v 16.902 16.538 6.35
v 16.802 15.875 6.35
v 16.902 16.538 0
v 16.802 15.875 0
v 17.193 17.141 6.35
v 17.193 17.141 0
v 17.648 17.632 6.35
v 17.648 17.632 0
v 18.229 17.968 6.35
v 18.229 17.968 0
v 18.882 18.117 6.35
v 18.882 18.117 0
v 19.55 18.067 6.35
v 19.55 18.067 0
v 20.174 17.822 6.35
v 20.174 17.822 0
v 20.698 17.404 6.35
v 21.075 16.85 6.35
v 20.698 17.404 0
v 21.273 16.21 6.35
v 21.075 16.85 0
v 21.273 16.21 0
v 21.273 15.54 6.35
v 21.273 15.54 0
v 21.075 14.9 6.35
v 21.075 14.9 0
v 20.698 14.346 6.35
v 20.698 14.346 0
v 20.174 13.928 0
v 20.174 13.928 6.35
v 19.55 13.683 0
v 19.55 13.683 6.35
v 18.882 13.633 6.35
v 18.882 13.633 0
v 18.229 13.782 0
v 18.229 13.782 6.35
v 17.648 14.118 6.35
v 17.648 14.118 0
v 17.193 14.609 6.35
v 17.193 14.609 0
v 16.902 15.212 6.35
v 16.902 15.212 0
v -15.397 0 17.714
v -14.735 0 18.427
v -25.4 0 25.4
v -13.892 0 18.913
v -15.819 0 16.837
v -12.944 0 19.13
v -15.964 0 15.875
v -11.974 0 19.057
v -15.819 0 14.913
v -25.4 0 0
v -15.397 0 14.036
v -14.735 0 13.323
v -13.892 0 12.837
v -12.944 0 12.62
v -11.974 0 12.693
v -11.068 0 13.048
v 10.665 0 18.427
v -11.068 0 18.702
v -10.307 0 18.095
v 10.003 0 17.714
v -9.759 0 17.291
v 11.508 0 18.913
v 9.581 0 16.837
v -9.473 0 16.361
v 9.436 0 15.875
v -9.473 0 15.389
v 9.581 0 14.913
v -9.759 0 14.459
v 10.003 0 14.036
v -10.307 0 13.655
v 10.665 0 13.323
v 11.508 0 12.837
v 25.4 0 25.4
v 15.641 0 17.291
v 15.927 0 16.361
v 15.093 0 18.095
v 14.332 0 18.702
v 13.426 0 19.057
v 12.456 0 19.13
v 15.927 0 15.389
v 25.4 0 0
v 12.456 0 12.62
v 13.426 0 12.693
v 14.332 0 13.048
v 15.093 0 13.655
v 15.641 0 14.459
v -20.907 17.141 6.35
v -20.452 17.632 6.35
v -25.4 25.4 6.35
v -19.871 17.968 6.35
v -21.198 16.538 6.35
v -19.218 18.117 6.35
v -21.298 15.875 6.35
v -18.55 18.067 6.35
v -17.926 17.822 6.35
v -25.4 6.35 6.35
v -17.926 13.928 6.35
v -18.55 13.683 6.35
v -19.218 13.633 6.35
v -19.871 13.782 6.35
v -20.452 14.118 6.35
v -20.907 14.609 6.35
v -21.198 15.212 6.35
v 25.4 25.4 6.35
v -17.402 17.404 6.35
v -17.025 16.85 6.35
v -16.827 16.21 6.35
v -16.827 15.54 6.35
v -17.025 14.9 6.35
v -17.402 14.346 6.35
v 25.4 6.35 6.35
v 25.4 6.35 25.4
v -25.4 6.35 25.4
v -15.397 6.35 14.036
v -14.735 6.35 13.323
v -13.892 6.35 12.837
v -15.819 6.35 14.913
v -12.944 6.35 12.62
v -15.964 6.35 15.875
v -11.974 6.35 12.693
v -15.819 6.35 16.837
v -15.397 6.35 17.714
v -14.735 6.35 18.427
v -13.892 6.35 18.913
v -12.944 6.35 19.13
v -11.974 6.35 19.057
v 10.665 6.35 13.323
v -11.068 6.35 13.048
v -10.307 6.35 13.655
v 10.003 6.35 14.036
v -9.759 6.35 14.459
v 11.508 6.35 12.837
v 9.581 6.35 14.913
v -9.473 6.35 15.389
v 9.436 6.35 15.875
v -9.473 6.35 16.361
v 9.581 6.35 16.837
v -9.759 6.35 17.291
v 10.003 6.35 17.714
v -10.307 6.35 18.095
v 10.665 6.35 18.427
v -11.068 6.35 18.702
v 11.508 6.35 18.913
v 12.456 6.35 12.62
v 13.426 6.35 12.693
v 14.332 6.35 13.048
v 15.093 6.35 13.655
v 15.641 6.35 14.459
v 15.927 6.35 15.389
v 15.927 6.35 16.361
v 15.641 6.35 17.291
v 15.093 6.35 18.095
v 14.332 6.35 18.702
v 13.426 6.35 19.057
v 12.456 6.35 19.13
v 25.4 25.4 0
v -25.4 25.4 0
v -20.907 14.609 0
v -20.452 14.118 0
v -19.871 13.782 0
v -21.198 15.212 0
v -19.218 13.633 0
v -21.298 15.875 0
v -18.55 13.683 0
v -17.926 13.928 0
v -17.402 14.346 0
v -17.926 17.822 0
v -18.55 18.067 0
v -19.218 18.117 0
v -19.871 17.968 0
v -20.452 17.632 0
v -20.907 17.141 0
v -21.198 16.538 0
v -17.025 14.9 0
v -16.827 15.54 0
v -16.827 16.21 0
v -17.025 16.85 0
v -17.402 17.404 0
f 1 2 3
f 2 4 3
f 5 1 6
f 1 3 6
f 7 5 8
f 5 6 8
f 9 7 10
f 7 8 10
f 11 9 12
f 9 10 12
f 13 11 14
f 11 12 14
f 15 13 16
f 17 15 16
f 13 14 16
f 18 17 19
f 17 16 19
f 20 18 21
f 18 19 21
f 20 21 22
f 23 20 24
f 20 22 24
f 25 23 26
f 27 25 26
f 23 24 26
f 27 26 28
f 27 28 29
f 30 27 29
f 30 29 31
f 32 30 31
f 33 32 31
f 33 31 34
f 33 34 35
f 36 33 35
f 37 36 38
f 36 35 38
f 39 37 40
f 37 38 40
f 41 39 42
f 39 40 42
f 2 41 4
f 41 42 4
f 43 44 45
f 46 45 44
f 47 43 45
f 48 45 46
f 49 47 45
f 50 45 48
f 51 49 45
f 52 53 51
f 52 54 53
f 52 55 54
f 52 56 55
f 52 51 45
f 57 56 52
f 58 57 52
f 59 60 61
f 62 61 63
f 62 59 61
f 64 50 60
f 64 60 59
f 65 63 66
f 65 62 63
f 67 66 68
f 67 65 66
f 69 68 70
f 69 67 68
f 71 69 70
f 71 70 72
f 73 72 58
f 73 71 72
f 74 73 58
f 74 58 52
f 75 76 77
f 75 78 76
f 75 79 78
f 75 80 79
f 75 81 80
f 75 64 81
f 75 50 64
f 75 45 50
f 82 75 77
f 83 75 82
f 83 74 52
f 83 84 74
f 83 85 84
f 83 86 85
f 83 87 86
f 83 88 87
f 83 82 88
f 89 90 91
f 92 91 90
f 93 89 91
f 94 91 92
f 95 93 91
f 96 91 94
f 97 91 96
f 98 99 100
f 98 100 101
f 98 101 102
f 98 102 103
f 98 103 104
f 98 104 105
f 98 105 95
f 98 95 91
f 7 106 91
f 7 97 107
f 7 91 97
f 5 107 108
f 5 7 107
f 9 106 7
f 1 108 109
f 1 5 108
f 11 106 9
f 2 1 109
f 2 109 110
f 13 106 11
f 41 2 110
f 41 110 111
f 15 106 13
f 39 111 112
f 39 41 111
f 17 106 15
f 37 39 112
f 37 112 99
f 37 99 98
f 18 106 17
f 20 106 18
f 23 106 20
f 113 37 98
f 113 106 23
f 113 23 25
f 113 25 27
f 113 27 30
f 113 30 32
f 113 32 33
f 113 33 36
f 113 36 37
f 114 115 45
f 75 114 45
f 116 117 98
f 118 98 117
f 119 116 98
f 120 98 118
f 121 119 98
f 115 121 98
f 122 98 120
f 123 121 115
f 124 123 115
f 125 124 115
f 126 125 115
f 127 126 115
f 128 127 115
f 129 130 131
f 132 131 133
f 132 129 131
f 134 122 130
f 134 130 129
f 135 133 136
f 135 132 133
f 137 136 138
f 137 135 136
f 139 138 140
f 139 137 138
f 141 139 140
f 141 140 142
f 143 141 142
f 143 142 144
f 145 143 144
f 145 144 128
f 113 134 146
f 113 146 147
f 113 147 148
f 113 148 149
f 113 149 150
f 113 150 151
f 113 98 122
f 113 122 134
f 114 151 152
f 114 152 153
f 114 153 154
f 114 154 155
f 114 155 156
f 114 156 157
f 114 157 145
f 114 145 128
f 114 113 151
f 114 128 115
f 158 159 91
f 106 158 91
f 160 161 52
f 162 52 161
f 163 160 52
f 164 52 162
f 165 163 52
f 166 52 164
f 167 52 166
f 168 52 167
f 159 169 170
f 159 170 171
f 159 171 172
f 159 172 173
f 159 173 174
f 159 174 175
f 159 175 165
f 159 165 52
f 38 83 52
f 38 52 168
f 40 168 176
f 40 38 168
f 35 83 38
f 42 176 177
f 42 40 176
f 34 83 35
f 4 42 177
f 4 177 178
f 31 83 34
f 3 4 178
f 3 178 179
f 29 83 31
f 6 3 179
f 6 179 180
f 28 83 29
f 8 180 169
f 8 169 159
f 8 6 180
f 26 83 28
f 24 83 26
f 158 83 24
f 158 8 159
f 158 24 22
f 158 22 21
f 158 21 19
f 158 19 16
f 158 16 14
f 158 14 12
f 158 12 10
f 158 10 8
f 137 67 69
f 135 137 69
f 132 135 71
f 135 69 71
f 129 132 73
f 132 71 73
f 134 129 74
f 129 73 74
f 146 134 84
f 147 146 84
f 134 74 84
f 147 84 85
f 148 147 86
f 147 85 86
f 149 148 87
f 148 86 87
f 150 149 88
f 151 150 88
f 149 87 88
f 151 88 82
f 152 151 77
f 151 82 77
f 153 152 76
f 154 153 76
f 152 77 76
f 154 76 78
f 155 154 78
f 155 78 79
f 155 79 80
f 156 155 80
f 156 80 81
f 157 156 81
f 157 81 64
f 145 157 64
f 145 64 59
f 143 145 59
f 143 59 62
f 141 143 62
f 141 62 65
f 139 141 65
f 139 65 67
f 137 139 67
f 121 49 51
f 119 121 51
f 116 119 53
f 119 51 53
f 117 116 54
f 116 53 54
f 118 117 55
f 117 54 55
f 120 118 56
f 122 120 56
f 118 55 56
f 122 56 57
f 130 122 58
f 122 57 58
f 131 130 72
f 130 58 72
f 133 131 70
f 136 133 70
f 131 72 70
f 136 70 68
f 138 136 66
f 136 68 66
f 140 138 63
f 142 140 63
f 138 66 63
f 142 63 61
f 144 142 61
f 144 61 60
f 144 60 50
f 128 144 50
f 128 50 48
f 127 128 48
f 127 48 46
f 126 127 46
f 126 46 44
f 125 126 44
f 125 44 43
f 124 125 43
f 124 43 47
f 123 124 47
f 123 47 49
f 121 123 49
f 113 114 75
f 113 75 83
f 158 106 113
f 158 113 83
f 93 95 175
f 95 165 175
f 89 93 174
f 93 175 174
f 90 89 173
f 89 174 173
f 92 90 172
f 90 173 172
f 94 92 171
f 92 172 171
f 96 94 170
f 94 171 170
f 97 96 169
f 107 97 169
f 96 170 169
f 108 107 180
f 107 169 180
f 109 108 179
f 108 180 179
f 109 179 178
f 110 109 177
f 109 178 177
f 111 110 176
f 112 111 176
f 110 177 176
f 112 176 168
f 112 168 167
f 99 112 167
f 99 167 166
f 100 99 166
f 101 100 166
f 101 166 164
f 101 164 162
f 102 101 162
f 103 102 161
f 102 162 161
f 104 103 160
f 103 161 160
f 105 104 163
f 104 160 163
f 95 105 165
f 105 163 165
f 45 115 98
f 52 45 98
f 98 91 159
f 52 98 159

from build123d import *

# Parameters (mm, degrees)
BOSS_EXTRUDE1_DEPTH       = 25.4
F_1_4_CLEARANCE_HOLE1_D   = 6.5278
F_8_CLEARANCE_HOLE1_D     = 4.4958
F_8_CLEARANCE_HOLE1_DEPTH = 6.35
F_8_CLEARANCE_HOLE1_TIP   = 1.350674586


with BuildPart() as part:
    # Sketch1 → Boss-Extrude1 (new, symmetric)
    with BuildSketch(Plane(origin=(0, 0, 0), x_dir=(0, 0, -1), z_dir=(1, 0, 0))):
        Polygon((0, 0), (0, 25.4), (-6.35, 25.4), (-6.35, 6.35), (-25.4, 6.35), (-25.4, 0), align=None)
    extrude(amount=BOSS_EXTRUDE1_DEPTH, both=True)

    # 1/4 Clearance Hole1 (through all)
    with Locations(Plane(origin=(0, 6.35, 0), x_dir=(1, 0, 0), z_dir=(0, 1, 0))):
        with Locations((-12.7, -15.875), (12.7, -15.875)):
            Hole(F_1_4_CLEARANCE_HOLE1_D / 2)

    # #8 Clearance Hole1
    with Locations(Plane.XY.offset(6.35)):
        with Locations((-19.05, 15.875), (19.05, 15.875)):
            Hole(F_8_CLEARANCE_HOLE1_D / 2, depth=F_8_CLEARANCE_HOLE1_DEPTH)
            with Locations((0, 0, -(F_8_CLEARANCE_HOLE1_DEPTH + F_8_CLEARANCE_HOLE1_TIP / 2))):  # 118° drill point
                Cone(0, F_8_CLEARANCE_HOLE1_D / 2, F_8_CLEARANCE_HOLE1_TIP, mode=Mode.SUBTRACT)


solid = part.part
